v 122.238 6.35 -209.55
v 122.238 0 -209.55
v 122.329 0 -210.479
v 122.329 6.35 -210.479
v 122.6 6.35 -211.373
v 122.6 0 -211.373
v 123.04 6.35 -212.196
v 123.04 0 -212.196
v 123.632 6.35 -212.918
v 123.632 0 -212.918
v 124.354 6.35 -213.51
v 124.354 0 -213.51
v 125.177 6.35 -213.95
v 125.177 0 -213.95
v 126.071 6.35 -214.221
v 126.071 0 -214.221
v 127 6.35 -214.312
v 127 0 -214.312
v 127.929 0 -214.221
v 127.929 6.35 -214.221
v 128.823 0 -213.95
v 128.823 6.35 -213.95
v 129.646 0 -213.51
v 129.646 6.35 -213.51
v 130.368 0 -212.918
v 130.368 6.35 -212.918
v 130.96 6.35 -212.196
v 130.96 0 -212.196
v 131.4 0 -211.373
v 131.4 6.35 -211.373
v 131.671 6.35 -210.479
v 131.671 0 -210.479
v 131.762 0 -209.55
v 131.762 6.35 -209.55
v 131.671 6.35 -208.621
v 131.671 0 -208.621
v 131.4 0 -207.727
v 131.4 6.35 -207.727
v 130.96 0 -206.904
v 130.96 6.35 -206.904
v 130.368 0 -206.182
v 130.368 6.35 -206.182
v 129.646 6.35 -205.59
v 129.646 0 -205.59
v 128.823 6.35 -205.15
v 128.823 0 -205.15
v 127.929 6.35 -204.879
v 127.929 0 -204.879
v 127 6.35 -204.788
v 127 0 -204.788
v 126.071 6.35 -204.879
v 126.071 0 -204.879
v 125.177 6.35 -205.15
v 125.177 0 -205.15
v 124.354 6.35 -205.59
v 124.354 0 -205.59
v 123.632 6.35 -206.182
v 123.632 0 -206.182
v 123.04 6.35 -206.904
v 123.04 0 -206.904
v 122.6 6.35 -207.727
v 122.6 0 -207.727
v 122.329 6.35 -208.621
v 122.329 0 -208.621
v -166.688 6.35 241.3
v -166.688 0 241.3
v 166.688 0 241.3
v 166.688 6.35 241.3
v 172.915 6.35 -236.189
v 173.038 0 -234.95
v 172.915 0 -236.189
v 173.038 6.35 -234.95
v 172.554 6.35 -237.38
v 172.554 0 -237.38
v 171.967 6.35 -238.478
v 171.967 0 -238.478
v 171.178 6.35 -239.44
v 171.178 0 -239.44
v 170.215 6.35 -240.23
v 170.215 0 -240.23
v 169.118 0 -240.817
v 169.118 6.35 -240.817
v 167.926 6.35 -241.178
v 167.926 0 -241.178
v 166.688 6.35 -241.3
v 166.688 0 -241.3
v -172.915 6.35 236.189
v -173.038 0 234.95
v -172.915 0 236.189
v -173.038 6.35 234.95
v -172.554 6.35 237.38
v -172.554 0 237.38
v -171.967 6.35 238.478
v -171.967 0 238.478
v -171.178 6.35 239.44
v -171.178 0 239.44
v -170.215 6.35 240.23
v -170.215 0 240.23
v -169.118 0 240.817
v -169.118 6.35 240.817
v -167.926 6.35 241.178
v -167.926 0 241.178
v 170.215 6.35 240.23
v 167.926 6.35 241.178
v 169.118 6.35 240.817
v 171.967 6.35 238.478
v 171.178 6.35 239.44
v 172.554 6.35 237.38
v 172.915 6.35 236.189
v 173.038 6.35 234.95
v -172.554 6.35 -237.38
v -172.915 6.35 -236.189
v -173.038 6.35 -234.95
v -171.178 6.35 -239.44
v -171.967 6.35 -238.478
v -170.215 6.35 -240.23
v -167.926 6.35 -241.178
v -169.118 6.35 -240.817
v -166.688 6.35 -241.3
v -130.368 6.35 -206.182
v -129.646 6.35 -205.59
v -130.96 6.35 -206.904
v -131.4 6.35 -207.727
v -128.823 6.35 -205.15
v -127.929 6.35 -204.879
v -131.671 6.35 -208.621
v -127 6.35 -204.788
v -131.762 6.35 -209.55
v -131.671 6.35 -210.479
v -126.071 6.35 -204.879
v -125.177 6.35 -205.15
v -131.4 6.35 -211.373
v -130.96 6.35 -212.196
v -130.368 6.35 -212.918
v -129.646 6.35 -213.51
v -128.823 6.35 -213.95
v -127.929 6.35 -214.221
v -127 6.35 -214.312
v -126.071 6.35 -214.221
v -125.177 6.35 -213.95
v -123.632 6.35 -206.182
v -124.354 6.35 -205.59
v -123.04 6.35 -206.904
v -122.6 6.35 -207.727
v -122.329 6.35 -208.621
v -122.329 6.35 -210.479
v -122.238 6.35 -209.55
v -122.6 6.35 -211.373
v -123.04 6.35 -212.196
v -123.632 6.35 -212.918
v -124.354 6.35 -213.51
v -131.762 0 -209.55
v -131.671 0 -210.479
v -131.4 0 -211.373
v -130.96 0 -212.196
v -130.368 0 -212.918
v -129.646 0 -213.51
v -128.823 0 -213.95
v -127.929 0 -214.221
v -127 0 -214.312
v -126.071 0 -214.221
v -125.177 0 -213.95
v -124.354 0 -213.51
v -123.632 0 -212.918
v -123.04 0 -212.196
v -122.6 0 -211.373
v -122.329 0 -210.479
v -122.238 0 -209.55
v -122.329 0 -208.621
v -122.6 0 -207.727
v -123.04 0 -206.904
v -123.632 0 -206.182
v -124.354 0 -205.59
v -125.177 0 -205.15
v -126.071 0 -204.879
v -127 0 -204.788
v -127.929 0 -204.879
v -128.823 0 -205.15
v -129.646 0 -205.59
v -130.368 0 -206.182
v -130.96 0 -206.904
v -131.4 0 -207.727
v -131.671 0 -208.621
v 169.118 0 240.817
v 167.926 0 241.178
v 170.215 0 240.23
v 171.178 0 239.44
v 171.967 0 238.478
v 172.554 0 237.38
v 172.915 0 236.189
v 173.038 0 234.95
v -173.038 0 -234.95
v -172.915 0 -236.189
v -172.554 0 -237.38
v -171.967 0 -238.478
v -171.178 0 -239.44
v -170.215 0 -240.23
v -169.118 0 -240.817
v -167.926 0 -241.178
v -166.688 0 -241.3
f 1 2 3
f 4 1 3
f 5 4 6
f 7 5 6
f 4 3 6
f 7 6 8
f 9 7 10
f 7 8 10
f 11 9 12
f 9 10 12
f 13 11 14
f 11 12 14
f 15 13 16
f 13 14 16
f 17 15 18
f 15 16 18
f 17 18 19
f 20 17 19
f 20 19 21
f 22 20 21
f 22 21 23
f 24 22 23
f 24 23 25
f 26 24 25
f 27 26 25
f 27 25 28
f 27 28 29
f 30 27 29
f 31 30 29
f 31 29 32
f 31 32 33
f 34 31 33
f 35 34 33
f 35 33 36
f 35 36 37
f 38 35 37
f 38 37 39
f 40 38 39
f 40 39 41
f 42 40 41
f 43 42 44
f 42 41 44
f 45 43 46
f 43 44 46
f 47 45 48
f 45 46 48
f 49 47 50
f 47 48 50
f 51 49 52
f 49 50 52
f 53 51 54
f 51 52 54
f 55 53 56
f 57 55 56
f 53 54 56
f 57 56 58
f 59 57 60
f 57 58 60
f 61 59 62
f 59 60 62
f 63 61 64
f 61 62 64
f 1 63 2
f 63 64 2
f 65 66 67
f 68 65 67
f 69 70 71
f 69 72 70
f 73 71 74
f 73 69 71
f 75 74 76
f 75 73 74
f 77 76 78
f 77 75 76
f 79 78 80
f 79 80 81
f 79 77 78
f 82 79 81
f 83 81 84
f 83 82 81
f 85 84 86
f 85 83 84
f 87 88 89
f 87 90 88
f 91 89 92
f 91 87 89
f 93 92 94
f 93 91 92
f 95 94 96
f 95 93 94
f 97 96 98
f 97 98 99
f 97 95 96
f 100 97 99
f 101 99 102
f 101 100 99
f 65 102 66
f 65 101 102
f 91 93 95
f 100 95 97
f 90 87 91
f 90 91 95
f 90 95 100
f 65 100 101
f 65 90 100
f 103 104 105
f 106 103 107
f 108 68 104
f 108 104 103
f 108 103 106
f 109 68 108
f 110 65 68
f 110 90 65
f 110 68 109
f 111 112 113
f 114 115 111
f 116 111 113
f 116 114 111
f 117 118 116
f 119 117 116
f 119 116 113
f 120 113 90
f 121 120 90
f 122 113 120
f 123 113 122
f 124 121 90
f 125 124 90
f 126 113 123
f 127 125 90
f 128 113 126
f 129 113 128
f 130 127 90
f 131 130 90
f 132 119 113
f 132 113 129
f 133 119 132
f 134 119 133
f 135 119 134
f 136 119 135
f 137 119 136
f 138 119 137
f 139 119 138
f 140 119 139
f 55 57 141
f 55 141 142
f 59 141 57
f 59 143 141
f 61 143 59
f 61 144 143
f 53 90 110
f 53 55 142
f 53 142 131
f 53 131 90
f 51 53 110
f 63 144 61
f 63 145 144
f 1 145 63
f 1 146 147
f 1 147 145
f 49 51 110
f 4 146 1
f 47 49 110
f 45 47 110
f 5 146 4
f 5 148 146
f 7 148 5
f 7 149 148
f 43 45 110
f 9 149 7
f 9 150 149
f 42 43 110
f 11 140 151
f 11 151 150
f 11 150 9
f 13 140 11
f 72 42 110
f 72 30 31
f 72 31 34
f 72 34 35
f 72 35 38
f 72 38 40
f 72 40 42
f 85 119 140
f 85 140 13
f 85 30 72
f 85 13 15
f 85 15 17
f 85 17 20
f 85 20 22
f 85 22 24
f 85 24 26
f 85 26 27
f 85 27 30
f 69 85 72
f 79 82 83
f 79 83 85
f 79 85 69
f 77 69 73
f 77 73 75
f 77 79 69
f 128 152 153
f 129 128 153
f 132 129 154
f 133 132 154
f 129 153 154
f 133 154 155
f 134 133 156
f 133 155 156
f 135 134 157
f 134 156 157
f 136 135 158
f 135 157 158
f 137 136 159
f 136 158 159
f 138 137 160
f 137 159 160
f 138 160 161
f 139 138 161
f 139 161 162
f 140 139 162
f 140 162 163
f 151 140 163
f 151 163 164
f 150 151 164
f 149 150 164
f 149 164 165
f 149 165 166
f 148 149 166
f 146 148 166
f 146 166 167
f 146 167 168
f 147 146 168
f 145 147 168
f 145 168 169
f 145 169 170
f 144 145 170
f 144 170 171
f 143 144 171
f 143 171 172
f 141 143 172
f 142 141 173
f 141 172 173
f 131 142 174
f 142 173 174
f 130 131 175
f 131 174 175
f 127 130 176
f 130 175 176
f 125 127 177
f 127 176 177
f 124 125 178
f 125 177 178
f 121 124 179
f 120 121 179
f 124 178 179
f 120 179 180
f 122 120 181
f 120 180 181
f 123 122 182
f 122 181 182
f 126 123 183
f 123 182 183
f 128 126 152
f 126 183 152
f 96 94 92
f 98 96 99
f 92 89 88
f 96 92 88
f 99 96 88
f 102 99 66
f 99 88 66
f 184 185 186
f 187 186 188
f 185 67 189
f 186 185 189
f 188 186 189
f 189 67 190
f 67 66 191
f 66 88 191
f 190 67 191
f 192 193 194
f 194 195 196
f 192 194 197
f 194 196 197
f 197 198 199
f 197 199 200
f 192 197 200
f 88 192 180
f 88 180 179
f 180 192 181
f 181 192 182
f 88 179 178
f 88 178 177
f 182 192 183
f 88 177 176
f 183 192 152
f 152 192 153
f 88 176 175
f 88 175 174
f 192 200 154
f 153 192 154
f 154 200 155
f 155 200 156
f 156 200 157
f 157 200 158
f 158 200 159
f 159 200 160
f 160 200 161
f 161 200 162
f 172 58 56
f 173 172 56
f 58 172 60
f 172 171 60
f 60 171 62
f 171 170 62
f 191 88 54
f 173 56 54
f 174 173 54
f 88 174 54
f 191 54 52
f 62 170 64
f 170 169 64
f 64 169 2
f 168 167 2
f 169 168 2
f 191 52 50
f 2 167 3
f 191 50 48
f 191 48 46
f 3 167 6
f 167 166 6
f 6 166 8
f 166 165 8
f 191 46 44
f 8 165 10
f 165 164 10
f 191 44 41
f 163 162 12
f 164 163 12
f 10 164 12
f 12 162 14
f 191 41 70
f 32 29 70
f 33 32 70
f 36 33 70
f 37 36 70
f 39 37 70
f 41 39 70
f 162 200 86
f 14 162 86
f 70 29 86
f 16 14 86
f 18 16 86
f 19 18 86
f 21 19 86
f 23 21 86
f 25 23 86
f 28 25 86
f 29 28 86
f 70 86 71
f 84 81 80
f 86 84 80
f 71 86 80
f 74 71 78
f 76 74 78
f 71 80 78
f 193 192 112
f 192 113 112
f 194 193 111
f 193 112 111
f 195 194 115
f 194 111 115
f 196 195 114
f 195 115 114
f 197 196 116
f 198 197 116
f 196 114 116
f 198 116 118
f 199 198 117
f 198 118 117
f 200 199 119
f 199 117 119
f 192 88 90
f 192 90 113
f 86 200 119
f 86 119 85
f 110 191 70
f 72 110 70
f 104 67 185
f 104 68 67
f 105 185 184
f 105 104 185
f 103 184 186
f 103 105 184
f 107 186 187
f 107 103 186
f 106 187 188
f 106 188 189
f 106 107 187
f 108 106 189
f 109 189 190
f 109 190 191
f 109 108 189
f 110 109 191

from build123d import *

# Parameters (mm, degrees)
SKETCH1_W                    = 346.075
SKETCH1_H                    = 482.6
BOSS_EXTRUDE1_DEPTH          = 6.35
FILLET1_R                    = 6.35
F_3_8_0_375_DIAMETER_HOLE1_D = 9.525


with BuildPart() as part:
    # Sketch1 → Boss-Extrude1 (new body)
    with BuildSketch(Plane(origin=(0, 0, 0), x_dir=(1, 0, 0), z_dir=(0, 1, 0))):
        Rectangle(SKETCH1_W, SKETCH1_H)
    extrude(amount=BOSS_EXTRUDE1_DEPTH)

    # Fillet1
    fillet1_edges = [part.edges().sort_by_distance(p)[0] for p in [
        (173.0375, 3.175, 241.3),
        (-173.0375, 3.175, 241.3),
        (-173.0375, 3.175, -241.3),
        (173.0375, 3.175, -241.3),
    ]]
    fillet(fillet1_edges, radius=FILLET1_R)

    # 3/8 (0.375) Diameter Hole1 (through all)
    with Locations(Plane(origin=(0, 6.35, 0), x_dir=(1, 0, 0), z_dir=(0, 1, 0))):
        with Locations((-127, 209.55), (127, 209.55)):
            Hole(F_3_8_0_375_DIAMETER_HOLE1_D / 2)


solid = part.part
